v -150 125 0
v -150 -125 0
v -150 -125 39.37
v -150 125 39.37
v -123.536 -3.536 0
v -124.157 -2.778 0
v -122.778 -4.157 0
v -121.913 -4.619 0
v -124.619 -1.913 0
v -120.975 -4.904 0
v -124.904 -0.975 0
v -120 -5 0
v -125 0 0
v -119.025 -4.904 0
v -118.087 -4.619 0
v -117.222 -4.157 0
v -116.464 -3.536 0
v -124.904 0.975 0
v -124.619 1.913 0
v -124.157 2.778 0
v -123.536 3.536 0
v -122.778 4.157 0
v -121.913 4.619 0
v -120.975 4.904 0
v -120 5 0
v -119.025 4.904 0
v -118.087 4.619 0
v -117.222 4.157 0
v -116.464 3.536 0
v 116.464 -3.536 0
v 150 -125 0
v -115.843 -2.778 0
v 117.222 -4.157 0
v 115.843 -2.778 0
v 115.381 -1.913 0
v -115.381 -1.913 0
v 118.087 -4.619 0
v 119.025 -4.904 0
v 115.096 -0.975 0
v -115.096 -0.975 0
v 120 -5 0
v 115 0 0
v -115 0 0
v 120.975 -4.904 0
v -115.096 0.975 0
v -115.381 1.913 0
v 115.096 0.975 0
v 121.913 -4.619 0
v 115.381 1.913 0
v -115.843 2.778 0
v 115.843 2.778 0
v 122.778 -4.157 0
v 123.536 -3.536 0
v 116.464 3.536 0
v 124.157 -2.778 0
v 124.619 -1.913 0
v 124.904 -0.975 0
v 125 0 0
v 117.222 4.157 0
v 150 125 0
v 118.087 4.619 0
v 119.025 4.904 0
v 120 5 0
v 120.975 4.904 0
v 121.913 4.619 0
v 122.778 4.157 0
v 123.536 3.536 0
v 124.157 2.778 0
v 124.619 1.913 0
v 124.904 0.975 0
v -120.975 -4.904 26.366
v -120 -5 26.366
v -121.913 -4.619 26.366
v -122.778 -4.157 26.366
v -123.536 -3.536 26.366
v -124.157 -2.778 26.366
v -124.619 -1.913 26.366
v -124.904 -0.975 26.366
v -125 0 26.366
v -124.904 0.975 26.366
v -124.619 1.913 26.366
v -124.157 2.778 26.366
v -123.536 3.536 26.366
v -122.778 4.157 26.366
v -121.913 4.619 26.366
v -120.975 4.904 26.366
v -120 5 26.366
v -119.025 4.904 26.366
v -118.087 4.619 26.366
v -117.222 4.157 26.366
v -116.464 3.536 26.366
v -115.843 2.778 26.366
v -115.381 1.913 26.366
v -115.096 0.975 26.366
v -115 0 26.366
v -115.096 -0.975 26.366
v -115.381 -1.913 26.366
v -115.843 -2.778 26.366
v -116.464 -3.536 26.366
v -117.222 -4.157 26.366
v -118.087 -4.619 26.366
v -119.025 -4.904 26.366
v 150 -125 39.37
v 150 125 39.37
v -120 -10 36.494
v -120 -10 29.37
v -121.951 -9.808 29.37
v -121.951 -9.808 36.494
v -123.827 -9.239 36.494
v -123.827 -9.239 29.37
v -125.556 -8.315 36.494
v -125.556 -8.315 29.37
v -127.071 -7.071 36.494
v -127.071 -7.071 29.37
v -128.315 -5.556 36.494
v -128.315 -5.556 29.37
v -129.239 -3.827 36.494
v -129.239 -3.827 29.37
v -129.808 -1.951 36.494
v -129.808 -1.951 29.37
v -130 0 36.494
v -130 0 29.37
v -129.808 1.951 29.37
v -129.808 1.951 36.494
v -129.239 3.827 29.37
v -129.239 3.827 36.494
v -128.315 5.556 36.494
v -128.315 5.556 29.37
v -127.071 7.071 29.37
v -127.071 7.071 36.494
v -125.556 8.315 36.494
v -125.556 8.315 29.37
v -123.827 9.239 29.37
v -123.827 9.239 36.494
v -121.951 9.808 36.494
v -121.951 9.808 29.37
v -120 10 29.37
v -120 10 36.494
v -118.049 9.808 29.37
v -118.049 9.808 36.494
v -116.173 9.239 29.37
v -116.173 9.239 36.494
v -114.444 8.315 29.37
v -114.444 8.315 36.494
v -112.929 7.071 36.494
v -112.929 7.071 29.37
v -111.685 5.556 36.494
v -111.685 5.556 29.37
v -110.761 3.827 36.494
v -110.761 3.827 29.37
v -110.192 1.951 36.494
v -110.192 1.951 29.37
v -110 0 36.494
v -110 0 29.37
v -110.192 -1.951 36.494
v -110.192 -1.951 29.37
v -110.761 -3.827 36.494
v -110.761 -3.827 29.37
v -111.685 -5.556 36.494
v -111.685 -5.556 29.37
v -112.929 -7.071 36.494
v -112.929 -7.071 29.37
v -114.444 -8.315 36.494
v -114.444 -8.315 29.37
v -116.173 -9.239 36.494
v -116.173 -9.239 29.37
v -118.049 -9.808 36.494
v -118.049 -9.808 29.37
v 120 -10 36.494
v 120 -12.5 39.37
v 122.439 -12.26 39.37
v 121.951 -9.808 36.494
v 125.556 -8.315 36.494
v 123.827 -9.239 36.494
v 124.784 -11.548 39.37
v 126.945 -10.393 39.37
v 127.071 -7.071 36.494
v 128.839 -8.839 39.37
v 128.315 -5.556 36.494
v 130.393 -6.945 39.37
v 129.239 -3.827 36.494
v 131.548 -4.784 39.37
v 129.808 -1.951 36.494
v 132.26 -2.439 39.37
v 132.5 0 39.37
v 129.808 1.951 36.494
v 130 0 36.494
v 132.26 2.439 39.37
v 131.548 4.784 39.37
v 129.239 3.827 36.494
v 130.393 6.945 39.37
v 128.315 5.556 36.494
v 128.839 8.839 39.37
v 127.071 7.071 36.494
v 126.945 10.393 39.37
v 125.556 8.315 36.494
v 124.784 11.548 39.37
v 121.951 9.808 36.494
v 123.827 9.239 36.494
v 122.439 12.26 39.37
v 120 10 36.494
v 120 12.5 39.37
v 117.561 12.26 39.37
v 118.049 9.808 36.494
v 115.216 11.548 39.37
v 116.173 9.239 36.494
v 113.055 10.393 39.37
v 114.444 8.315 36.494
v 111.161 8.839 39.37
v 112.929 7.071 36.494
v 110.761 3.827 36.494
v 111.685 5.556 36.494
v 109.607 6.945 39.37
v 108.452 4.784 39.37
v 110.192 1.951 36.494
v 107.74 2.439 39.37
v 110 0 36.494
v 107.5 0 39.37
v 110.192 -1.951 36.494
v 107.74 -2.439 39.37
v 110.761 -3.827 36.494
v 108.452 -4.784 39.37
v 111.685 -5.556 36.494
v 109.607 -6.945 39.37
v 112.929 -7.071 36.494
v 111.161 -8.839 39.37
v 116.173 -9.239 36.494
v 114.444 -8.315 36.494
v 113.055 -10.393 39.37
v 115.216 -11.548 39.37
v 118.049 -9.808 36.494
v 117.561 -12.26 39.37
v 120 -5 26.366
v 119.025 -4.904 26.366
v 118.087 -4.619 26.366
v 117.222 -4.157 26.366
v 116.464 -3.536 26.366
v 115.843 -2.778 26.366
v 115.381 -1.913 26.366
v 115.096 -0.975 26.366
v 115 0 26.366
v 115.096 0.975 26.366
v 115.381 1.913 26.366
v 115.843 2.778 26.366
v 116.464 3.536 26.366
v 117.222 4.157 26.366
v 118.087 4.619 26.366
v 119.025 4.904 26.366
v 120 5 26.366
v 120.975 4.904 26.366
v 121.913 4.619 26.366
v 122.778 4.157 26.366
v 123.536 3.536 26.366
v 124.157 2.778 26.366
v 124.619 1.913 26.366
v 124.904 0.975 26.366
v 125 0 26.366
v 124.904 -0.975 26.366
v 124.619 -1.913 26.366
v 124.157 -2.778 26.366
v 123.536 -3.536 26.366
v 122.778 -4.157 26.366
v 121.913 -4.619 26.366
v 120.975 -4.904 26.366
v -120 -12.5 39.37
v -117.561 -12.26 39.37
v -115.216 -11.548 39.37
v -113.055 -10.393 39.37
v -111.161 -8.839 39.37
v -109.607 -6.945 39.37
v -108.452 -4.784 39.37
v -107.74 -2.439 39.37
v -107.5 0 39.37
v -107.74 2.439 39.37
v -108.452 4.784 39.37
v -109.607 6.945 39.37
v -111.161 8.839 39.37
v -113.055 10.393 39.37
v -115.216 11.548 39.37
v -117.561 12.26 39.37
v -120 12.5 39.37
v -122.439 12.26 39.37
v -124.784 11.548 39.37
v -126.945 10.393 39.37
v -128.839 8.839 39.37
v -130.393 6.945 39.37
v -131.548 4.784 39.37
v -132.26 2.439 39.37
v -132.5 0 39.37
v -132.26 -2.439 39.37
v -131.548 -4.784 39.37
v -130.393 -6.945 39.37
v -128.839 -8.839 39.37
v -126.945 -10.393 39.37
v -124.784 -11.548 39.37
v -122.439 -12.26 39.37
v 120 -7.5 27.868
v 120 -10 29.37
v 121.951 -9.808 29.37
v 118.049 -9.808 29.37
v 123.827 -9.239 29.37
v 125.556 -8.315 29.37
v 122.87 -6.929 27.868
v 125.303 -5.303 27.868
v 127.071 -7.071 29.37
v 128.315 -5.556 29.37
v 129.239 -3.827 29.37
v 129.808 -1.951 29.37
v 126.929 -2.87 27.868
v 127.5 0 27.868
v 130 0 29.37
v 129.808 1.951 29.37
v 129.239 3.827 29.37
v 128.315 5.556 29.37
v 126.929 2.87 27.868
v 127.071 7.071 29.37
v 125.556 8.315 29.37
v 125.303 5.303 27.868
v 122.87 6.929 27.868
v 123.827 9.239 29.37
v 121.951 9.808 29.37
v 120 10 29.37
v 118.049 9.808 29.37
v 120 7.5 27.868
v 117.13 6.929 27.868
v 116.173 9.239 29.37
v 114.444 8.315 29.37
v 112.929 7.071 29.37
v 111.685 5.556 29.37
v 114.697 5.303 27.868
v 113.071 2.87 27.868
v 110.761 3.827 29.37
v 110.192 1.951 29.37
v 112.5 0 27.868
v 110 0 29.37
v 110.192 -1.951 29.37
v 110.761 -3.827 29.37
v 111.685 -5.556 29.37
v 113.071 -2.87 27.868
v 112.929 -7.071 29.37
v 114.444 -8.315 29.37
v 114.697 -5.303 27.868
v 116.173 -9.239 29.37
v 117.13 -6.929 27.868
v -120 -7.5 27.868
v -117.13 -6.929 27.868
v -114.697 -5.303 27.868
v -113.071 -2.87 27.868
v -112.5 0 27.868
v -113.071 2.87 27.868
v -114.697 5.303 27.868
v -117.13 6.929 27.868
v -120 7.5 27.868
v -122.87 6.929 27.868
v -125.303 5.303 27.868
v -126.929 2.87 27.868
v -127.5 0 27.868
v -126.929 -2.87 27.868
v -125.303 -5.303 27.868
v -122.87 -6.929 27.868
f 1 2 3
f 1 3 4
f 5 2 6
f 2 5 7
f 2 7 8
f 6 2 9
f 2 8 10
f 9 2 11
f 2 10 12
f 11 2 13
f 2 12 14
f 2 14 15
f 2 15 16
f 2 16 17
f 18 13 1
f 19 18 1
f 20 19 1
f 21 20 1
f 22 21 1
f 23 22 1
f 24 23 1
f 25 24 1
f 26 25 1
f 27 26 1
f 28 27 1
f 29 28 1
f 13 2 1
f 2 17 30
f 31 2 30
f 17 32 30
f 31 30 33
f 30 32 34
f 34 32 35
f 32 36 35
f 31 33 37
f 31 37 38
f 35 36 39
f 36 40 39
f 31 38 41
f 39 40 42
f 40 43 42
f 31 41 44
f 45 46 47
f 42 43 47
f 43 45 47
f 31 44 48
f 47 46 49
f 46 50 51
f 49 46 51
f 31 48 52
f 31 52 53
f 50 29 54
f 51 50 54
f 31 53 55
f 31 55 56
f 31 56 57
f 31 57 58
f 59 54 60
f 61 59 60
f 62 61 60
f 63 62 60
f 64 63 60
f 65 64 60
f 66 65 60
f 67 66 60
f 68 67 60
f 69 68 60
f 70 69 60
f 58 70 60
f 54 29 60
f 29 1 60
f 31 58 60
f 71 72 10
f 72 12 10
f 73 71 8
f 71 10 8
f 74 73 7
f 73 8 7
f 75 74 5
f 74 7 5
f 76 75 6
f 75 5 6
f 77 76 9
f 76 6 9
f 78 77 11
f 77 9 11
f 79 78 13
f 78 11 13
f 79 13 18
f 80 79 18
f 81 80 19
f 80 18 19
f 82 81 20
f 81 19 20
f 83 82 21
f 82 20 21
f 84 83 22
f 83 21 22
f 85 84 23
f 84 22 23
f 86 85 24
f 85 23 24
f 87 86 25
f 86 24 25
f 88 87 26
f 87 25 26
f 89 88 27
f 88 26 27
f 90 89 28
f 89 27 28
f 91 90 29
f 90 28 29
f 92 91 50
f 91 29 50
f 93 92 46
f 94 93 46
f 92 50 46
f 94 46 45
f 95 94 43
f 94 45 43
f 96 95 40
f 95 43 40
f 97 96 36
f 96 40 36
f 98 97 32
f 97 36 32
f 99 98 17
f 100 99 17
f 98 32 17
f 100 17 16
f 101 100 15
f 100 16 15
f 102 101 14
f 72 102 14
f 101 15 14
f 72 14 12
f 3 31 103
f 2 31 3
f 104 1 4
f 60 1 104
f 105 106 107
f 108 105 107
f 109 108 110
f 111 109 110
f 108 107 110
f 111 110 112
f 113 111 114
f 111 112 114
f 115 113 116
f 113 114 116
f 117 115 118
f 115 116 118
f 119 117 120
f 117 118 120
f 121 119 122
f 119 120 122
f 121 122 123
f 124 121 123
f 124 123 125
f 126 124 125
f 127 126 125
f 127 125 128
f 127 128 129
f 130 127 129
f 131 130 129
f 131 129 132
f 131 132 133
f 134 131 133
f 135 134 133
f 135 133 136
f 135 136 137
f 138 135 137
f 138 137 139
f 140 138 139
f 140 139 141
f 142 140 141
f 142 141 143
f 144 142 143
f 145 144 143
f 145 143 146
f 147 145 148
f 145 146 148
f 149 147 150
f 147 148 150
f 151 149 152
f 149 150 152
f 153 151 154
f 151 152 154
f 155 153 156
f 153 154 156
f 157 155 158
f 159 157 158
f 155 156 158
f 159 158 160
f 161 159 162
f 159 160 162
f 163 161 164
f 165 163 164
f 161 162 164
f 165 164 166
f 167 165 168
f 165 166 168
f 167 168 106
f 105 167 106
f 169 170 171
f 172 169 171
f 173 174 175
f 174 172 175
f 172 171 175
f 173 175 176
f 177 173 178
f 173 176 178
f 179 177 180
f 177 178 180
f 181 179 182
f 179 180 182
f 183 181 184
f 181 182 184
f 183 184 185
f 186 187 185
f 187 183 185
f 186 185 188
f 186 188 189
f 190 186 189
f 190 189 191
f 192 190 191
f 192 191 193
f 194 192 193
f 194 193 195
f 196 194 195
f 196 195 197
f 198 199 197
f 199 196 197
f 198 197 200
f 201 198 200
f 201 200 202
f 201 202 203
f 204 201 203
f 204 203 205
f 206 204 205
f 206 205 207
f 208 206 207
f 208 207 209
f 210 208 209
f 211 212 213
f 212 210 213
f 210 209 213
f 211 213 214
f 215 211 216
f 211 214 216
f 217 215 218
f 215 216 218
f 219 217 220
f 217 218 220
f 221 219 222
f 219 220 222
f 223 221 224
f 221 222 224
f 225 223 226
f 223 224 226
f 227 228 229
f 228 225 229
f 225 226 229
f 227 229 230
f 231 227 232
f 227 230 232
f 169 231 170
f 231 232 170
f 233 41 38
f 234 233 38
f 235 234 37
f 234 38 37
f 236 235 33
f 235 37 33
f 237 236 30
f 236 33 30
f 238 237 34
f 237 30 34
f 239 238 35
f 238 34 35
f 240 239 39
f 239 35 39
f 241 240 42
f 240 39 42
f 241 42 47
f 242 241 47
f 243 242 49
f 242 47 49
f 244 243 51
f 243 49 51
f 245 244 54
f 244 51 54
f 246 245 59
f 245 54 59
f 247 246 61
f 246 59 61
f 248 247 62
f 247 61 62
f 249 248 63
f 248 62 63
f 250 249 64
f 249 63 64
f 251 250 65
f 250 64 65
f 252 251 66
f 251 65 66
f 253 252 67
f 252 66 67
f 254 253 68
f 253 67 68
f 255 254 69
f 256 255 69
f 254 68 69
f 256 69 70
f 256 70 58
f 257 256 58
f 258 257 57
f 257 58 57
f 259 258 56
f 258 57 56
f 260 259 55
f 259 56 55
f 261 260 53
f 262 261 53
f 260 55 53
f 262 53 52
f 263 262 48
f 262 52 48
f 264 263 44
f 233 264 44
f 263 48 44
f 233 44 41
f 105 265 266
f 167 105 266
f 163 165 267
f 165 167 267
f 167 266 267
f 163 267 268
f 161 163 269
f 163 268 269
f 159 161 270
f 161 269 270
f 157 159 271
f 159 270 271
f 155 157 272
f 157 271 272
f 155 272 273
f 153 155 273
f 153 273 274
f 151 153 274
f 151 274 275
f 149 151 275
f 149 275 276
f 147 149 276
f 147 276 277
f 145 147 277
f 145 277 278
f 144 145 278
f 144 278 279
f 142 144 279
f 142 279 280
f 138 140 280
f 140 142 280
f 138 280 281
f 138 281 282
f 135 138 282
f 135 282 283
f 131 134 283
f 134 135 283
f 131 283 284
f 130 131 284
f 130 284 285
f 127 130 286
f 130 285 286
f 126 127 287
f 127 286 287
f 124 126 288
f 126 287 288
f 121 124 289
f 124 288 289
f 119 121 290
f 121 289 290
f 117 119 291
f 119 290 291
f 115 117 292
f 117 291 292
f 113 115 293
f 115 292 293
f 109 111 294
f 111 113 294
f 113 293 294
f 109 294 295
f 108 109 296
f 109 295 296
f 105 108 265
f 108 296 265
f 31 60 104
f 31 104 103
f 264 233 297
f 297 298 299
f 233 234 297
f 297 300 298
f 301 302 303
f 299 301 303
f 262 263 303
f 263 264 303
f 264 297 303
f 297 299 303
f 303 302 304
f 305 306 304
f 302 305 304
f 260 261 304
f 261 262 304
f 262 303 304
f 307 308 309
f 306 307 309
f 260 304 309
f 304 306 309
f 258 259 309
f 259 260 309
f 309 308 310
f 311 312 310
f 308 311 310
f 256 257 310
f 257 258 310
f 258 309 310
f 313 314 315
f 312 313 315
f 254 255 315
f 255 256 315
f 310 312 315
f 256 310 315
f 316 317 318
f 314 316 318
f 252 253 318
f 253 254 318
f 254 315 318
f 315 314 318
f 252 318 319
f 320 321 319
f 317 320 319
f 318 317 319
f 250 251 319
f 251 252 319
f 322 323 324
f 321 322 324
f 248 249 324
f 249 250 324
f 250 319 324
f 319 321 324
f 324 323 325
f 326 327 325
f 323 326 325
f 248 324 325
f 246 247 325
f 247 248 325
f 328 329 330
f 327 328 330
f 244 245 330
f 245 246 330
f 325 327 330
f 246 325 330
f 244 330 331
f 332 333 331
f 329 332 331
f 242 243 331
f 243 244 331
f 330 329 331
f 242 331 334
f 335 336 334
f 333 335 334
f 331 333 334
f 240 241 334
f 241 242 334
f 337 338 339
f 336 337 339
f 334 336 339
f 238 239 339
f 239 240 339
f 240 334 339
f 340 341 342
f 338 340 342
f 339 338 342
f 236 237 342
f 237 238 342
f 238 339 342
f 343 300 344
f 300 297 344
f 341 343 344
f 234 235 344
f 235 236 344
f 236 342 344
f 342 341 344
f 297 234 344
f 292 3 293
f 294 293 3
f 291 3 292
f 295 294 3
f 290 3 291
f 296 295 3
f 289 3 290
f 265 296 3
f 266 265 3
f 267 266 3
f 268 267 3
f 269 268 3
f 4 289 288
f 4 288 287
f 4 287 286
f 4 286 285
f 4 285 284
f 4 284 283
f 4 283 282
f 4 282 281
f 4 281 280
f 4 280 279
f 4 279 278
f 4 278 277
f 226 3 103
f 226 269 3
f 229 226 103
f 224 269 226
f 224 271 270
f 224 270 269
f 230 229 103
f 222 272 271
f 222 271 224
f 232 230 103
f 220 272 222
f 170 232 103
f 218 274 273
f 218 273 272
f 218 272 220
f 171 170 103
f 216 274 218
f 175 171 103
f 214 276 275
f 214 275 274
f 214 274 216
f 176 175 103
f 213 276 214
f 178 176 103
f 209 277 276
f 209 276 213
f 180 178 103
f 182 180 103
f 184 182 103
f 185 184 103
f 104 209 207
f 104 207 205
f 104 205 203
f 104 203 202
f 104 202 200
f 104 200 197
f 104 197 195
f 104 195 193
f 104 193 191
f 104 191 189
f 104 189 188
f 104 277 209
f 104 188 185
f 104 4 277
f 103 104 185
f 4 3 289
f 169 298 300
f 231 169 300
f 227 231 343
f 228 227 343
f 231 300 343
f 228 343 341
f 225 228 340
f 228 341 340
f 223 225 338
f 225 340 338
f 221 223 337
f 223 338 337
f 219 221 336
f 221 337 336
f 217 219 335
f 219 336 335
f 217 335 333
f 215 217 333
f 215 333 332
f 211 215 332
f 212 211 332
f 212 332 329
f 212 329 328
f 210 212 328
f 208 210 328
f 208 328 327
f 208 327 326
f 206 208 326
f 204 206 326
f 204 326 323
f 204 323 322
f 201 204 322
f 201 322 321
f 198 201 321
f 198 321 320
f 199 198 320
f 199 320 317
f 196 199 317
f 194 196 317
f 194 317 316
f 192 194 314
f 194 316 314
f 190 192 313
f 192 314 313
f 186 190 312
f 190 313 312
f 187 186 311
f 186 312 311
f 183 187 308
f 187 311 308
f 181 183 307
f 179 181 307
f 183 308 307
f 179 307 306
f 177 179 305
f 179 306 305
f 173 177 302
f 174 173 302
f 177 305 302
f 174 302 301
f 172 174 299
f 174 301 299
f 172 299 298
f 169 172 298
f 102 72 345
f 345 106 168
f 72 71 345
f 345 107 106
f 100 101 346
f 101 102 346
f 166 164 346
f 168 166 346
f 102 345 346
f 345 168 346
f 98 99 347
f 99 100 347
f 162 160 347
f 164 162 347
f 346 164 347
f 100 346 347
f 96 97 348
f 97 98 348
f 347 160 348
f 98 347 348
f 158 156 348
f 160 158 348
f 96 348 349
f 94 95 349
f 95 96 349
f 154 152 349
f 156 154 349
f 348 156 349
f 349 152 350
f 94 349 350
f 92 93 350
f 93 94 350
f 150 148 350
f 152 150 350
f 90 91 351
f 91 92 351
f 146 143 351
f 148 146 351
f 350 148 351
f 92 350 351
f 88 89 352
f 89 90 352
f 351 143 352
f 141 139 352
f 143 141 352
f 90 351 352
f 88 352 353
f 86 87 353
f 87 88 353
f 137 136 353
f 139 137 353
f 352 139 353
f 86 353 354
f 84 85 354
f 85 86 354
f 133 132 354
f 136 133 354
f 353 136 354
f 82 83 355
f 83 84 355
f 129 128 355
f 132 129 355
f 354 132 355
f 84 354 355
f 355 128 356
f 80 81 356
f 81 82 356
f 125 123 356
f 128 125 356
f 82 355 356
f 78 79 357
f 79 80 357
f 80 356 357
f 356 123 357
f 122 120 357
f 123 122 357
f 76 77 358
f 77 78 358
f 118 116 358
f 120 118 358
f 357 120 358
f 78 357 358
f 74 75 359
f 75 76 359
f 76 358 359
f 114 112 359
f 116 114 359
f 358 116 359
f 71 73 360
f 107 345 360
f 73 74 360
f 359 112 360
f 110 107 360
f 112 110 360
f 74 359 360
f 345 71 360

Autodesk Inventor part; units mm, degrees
ref_plane "YZ Plane" through (0, 0, 0) normal (1, 0, 0) x (0, 1, 0)
ref_plane "XZ Plane" through (0, 0, 0) normal (0, 1, 0) x (-1, 0, 0)
ref_plane "XY Plane" through (0, 0, 0) normal (0, 0, 1) x (1, 0, 0)
sketch "Sketch1" plane through (0, 0, 0) normal (0, 0, 1) x (1, 0, 0)
  line L0 (-150, 125) -> (150, 125)
  line L1 (150, 125) -> (150, -125)
  line L2 (150, -125) -> (-150, -125)
  line L3 (-150, -125) -> (-150, 125)
  point P0 (0, 0)
  point P1 (0, 125)
  point P2 (150, 0)
  dimension "d0" = 300
  dimension "d1" = 250
extrude "Extrusion1" add sketch "Sketch1" along normal blind 39.37
sketch "Sketch2" plane through (0, 0, 39.37) normal (0, 0, 1) x (1, 0, 0)
  line L0 (-150, 125) -> (-150, -125) projected
  line L1 (150, 125) -> (-150, 125) construction
  line L2 (0, 125) -> (0, -125) construction
  line L3 (-150, -125) -> (150, -125) construction
  point P0 (0, 0)
  point P1 (-120, 0)
  point P2 (120, 0)
  dimension "d4" = 30
hole "Hole1" at (-120, 0, 39.37) at (120, 0, 39.37) direction (0, 0, -1) diameter 10 end through all
hole "Hole2" at (-120, 0, 39.37) at (120, 0, 39.37) direction (0, 0, -1) diameter 20 depth 10 tip angle 118 countersink diameter 25 countersink angle 82
properties part number "TablaInferior"
